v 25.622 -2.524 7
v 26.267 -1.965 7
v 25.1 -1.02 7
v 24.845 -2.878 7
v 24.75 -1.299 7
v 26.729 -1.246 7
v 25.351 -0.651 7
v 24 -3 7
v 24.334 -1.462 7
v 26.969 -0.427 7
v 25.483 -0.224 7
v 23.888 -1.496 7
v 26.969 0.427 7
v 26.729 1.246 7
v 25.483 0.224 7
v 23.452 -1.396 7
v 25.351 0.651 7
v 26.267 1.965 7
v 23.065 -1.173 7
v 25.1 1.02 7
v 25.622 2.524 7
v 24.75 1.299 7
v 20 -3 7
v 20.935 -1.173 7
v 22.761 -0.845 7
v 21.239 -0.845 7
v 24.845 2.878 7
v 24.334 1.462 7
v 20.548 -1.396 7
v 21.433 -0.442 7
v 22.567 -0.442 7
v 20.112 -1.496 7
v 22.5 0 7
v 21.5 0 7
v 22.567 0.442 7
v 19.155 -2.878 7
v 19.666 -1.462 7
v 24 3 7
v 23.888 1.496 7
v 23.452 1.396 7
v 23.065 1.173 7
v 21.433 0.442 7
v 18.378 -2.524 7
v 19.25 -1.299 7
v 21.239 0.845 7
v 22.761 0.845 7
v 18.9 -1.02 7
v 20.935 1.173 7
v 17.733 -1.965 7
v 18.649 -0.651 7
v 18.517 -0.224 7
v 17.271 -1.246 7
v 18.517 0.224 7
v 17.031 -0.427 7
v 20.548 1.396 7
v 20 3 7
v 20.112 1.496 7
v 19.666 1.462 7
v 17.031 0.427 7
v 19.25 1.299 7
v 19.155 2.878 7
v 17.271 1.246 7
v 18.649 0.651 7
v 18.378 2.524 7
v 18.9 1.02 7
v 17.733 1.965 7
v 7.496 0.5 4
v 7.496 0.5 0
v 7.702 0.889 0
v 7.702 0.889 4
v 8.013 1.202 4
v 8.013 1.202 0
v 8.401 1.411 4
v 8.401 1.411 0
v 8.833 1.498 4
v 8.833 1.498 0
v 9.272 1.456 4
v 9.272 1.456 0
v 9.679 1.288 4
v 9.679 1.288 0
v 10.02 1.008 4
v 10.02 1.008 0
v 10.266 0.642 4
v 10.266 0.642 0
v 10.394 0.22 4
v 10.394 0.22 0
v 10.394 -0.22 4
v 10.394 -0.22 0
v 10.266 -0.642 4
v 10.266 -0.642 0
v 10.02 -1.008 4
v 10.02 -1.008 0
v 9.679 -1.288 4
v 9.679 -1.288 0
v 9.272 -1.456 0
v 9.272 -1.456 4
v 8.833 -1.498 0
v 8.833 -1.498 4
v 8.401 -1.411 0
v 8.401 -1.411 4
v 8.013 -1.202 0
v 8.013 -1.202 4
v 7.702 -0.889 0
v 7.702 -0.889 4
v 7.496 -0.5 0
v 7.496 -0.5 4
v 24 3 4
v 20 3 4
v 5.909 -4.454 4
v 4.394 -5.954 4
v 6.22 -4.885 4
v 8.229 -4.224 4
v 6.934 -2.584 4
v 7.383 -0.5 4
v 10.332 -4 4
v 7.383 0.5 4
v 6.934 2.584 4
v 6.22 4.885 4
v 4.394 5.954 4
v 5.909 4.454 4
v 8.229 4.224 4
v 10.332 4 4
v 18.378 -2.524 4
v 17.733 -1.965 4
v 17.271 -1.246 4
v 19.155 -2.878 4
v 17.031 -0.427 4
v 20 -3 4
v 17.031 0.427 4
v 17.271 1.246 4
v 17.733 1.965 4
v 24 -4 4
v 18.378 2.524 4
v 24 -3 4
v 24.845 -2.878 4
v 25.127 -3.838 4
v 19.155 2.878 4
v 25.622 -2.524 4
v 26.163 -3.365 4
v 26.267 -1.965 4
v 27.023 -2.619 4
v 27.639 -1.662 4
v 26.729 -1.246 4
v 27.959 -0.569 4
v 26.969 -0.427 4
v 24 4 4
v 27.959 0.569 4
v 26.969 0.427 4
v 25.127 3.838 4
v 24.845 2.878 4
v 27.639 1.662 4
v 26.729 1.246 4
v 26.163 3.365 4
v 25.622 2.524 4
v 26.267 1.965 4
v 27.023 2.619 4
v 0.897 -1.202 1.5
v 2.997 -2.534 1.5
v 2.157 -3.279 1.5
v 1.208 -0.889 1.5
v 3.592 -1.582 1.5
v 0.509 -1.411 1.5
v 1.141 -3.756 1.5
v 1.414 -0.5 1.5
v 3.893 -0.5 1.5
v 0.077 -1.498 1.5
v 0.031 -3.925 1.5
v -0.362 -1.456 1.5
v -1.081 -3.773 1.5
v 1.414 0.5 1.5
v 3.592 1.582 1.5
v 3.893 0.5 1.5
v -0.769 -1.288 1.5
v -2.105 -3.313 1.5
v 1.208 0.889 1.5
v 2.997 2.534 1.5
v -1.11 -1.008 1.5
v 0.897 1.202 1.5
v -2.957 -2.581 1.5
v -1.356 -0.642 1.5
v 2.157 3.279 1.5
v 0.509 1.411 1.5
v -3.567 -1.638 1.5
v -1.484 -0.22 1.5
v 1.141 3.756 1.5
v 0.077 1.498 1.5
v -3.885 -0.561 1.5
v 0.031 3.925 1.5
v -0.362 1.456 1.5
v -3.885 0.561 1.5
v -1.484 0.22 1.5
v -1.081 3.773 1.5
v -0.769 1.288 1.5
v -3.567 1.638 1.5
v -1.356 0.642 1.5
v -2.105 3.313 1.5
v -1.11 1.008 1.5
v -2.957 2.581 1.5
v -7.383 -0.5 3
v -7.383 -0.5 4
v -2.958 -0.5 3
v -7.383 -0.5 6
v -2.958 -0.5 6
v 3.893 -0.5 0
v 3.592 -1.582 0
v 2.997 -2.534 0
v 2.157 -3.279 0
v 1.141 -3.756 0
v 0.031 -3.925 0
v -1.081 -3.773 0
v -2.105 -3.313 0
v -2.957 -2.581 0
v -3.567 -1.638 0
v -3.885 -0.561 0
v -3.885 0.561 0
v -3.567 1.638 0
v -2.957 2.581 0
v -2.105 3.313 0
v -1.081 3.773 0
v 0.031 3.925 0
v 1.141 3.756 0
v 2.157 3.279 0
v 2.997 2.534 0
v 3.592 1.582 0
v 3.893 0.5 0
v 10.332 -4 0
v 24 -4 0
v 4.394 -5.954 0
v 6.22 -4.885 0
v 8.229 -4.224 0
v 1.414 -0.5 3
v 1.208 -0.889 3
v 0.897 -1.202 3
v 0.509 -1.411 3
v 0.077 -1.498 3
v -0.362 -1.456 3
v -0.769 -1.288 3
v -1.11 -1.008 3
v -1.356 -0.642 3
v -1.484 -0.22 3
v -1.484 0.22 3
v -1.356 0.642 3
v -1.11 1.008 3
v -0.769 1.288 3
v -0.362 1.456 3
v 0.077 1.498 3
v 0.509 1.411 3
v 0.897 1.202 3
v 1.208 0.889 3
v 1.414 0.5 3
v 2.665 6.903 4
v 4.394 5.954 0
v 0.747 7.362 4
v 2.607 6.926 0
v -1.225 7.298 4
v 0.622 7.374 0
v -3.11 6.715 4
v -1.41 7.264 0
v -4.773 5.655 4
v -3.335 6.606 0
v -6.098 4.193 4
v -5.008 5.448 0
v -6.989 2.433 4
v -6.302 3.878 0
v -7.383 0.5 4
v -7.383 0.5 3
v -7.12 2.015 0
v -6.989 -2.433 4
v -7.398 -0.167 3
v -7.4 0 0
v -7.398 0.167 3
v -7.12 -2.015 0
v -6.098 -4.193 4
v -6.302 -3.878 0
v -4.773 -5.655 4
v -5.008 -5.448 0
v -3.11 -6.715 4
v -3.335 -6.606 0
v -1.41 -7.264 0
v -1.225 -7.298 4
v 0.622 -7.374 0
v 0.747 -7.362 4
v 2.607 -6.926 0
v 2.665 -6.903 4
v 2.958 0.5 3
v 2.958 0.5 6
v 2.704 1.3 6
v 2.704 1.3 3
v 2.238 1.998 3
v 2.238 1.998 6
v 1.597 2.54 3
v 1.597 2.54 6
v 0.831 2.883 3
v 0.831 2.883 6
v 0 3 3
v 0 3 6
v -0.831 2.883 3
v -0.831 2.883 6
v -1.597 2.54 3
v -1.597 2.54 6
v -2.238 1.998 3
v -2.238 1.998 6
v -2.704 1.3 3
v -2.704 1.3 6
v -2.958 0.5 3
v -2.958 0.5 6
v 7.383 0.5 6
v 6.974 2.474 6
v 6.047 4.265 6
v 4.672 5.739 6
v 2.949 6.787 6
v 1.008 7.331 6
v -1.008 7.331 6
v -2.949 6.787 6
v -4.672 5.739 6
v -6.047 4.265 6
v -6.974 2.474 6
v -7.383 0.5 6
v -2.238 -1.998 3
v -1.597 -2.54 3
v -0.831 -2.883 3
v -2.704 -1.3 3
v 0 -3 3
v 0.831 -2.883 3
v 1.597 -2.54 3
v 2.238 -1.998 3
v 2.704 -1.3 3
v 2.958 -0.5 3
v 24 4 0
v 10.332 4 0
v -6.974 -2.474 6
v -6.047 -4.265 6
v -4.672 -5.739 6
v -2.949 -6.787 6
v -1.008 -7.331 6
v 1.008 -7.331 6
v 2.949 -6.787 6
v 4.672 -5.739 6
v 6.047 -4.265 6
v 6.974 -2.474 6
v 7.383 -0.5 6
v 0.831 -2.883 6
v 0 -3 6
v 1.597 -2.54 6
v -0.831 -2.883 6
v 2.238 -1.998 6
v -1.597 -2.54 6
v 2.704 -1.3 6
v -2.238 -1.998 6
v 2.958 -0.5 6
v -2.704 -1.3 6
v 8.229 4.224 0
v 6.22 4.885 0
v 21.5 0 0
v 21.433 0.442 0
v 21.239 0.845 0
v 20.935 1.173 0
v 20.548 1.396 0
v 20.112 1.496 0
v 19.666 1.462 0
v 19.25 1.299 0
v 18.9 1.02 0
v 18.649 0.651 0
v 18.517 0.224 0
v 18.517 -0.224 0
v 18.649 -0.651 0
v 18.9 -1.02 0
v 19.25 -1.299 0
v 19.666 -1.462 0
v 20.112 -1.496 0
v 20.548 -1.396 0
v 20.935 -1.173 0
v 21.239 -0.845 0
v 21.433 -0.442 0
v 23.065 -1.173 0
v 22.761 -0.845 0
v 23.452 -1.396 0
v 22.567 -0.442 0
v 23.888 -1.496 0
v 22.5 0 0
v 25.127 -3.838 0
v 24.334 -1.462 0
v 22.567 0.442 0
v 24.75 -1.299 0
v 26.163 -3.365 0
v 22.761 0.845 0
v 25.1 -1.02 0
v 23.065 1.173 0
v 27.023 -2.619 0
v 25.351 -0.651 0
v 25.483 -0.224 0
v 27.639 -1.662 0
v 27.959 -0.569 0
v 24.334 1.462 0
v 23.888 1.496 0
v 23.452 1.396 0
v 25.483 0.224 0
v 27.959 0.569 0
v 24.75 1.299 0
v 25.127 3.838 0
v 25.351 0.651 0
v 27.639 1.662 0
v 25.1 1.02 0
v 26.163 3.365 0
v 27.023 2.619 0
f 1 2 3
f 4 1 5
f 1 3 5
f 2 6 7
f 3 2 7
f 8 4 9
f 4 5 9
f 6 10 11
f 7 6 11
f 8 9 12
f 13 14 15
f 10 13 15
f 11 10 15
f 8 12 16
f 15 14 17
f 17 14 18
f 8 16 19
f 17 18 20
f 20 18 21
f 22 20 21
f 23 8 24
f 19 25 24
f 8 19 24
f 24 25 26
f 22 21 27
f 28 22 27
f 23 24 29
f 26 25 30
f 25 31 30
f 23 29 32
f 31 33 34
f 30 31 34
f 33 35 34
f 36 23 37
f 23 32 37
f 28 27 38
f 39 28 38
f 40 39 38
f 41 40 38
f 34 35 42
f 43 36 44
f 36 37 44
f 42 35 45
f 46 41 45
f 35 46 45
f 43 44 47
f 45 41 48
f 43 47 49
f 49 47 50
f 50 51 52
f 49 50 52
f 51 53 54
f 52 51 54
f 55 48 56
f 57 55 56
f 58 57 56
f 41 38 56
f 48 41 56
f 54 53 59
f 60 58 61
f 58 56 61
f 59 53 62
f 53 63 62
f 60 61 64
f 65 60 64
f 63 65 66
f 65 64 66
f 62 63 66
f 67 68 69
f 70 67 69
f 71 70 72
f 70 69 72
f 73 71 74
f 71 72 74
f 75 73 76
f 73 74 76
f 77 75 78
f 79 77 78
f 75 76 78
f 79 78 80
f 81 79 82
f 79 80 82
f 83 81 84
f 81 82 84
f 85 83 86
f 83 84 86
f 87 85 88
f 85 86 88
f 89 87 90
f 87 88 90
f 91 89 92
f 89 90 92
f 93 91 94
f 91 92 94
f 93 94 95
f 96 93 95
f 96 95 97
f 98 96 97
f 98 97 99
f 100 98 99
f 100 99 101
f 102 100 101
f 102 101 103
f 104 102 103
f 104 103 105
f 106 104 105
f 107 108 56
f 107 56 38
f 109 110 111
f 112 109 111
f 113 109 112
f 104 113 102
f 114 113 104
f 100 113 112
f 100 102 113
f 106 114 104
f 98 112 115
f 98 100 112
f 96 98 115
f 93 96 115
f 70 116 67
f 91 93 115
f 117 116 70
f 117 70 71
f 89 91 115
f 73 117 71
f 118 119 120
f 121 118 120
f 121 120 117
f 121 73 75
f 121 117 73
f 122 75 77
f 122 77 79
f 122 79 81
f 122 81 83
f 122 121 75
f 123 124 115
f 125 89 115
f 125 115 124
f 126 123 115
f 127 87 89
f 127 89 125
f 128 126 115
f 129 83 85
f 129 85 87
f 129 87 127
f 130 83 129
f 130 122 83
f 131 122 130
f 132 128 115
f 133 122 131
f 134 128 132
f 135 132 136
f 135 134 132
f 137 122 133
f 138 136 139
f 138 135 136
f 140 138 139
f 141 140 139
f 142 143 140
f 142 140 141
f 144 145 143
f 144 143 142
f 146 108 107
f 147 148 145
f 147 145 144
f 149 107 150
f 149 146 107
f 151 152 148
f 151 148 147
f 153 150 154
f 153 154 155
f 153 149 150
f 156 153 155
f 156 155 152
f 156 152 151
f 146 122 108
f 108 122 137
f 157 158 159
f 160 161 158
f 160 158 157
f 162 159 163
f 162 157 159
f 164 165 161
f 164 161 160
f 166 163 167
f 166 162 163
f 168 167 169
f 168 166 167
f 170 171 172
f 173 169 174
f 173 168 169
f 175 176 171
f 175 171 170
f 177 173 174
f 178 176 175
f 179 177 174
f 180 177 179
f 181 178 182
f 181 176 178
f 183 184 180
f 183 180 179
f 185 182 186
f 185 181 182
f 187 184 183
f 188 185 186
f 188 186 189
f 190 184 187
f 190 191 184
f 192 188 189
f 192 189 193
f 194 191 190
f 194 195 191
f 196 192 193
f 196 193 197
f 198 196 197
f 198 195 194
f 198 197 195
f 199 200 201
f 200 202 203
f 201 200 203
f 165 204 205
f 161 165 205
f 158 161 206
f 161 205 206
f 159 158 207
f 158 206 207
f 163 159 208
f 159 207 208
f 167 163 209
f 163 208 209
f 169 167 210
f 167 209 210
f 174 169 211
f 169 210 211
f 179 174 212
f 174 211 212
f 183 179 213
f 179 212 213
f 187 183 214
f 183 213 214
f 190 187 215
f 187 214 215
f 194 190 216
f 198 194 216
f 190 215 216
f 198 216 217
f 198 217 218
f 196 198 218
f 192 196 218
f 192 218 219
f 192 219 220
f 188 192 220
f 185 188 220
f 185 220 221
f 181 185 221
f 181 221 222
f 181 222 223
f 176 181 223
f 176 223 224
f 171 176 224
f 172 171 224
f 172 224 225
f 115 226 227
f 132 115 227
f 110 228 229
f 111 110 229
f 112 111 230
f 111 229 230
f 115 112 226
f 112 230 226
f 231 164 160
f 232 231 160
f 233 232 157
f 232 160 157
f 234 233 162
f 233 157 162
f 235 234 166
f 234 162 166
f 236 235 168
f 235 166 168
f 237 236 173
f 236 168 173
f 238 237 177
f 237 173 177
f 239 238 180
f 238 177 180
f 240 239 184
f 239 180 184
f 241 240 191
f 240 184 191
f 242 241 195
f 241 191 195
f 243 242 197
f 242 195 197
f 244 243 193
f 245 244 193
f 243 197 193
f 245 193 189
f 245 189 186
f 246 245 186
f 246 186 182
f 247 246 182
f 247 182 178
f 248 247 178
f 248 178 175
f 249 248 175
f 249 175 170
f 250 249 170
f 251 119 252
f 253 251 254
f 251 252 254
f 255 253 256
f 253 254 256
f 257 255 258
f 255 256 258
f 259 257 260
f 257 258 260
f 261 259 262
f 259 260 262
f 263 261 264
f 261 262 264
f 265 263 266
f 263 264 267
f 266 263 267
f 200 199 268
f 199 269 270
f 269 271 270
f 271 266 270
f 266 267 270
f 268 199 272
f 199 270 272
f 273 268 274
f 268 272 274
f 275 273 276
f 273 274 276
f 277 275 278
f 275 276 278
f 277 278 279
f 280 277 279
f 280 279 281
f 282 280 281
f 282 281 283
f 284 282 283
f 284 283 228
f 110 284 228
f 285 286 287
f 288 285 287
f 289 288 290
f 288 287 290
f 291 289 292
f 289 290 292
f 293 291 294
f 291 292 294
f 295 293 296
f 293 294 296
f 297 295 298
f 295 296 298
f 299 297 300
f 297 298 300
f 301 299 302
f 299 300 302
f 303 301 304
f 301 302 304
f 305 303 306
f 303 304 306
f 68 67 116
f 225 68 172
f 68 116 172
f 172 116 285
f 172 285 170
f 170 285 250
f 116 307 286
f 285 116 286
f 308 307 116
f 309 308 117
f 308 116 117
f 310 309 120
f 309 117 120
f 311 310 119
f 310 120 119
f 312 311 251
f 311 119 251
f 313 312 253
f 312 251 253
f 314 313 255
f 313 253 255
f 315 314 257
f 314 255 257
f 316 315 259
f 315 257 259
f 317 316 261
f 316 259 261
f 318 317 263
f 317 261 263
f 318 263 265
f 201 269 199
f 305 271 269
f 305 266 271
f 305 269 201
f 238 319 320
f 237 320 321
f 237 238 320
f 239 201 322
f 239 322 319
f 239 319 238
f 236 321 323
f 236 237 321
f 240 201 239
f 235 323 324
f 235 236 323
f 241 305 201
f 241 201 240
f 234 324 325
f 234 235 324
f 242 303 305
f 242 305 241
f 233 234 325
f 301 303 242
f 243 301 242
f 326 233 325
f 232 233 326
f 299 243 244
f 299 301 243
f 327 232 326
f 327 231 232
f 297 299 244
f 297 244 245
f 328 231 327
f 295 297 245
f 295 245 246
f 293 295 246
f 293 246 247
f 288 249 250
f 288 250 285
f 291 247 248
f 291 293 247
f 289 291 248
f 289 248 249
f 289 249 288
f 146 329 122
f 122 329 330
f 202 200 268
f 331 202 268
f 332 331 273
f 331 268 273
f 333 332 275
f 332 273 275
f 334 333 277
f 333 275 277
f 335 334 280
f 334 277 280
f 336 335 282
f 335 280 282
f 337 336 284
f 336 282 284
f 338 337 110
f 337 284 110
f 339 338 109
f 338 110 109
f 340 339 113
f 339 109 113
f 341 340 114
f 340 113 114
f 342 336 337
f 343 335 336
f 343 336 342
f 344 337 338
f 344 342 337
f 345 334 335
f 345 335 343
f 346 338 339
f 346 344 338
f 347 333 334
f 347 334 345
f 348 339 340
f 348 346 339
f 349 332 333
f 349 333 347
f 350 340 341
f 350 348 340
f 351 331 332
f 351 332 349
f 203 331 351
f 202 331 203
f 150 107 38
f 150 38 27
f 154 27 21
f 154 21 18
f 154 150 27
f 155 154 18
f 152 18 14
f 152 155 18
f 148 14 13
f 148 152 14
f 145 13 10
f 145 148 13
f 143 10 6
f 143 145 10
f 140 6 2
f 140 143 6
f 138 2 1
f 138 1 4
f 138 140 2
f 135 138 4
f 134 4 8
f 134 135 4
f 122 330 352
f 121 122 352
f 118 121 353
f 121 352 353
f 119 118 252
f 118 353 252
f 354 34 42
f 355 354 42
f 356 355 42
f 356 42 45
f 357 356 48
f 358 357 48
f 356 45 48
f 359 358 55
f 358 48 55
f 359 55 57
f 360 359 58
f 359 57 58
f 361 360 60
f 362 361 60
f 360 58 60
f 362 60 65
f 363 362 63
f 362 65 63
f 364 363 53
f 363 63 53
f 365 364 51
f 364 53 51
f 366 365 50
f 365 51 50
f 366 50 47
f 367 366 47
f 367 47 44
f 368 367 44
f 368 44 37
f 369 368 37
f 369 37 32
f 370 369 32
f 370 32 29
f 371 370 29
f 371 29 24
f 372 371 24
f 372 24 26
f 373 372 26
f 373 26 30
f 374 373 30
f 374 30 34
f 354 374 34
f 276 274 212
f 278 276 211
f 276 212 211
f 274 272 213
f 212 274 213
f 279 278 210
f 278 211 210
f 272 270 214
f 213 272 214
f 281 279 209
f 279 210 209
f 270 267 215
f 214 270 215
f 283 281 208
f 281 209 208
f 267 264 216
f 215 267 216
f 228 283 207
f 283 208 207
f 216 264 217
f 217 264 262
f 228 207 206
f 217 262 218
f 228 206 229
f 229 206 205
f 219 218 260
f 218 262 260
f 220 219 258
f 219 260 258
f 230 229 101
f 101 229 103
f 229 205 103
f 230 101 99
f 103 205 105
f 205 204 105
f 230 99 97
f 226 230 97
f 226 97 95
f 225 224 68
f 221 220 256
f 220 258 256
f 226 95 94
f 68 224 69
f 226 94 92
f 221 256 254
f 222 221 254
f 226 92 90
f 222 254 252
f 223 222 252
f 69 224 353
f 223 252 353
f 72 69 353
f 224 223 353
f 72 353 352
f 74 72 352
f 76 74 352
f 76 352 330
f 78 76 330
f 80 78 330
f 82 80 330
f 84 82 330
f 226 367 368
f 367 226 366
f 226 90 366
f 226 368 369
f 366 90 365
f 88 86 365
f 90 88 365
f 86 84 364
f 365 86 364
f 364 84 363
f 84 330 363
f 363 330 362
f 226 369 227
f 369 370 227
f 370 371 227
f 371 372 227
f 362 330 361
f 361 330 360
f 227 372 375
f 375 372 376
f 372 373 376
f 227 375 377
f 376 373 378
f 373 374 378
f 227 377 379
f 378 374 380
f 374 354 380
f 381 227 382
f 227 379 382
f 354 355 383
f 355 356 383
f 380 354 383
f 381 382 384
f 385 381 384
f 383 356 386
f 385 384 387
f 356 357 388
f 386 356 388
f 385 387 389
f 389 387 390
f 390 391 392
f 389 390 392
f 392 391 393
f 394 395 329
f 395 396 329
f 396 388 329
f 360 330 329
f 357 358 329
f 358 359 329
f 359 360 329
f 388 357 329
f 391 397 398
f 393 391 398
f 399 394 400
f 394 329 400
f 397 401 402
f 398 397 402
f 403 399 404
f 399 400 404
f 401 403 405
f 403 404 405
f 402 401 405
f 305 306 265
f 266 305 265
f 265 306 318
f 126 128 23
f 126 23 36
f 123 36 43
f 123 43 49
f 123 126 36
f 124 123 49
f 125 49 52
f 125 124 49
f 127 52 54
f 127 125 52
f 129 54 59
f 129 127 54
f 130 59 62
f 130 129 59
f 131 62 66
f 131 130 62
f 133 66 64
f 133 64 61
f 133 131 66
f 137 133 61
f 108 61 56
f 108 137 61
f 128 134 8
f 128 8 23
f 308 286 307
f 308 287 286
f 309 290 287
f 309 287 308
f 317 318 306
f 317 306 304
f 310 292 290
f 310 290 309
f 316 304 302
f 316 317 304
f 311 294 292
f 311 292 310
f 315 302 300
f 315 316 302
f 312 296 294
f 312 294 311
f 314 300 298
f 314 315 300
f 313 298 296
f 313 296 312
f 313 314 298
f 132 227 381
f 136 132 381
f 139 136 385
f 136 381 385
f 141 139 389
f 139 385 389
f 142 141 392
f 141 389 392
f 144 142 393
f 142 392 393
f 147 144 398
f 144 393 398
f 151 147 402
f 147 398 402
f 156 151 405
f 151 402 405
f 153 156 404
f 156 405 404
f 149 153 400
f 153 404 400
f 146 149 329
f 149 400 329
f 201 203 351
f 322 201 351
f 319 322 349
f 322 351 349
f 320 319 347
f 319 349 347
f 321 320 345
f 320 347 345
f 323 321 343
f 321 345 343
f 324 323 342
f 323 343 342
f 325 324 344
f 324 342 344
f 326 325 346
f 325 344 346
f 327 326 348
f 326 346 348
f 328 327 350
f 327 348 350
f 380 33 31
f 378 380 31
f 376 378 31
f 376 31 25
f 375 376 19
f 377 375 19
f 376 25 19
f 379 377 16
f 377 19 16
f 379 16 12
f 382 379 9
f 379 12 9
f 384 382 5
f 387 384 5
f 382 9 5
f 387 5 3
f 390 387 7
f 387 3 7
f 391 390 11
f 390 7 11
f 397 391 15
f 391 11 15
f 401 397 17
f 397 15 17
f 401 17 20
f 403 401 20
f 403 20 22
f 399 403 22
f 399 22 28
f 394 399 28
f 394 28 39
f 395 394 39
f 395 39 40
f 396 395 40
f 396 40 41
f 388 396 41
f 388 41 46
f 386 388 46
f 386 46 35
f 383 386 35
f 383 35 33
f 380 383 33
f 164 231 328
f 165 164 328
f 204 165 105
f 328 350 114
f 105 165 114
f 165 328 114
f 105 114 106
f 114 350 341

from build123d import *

# Parameters (mm, degrees)
EXTRUDE_1_DEPTH     = 4
SKETCH_3_R          = 7.4
EXTRUDE_2_DEPTH     = 2
EXTRUDE_3_DEPTH     = 3
CUT_EXTRUDE_1_DEPTH = 3
SKETCH_7_R          = 1.5
CUT_EXTRUDE_2_DEPTH = 30.795301643
CUT_EXTRUDE_3_DEPTH = 30.795301643
SKETCH_10_R         = 3.925
CUT_EXTRUDE_4_DEPTH = 1.5


with BuildPart() as part:
    # ｽｹｯﾁ2 → ﾎﾞｽ - 押し出し1 (new body)
    with BuildSketch(Plane.XY):
        with BuildLine():
            Line((24, 4), (10.332473082, 4))
            ThreePointArc((10.332473082, 4), (7.206754774, 4.50105874), (4.394270162, 5.954022989))
            ThreePointArc((4.394270162, 5.954022989), (-7.4, 0), (4.394270162, -5.954022989))
            ThreePointArc((4.394270162, -5.954022989), (7.206754774, -4.50105874), (10.332473082, -4))
            Line((10.332473082, -4), (24, -4))
            ThreePointArc((24, -4), (28, 0), (24, 4))
        make_face()
    extrude(amount=EXTRUDE_1_DEPTH)

    # ｽｹｯﾁ3 → ﾎﾞｽ - 押し出し2 (add)
    with BuildSketch(Plane.XY.offset(4)):
        with Locations(Location((0, 0, 0), (0, 0, 53.571420986))):
            Circle(SKETCH_3_R)
    extrude(amount=EXTRUDE_2_DEPTH)

    # ｽｹｯﾁ4 → ﾎﾞｽ - 押し出し3 (add)
    with BuildSketch(Plane.XY.offset(4)):
        with BuildLine():
            Line((24, -3), (20, -3))
            ThreePointArc((20, -3), (17, 0), (20, 3))
            Line((20, 3), (24, 3))
            ThreePointArc((24, 3), (27, 0), (24, -3))
        make_face()
    extrude(amount=EXTRUDE_3_DEPTH)

    # ｽｹｯﾁ6 → ｶｯﾄ - 押し出し1 (cut)
    with BuildSketch(Plane.XY.offset(6)):
        with BuildLine():
            Line((7.4, 0.5), (2.958039892, 0.5))
            ThreePointArc((2.958039892, 0.5), (0, 3), (-2.958039892, 0.5))
            Line((-2.958039892, 0.5), (-7.4, 0.5))
            Line((-7.4, 0.5), (-7.4, -0.5))
            Line((-7.4, -0.5), (-2.958039892, -0.5))
            ThreePointArc((-2.958039892, -0.5), (0, -3), (2.958039892, -0.5))
            Line((2.958039892, -0.5), (7.4, -0.5))
            Line((7.4, -0.5), (7.4, 0.5))
        make_face()
    extrude(amount=-CUT_EXTRUDE_1_DEPTH, mode=Mode.SUBTRACT)

    # ｽｹｯﾁ7 → ｶｯﾄ - 押し出し2 (cut, through all)
    with BuildSketch(Plane.XY.offset(7)):
        with Locations((20, 0)):
            Circle(SKETCH_7_R)
        with Locations(Location((24, 0, 0), (0, 0, 180))):
            Circle(SKETCH_7_R)
    extrude(amount=-CUT_EXTRUDE_2_DEPTH, mode=Mode.SUBTRACT)

    # ｽｹｯﾁ8 → ｶｯﾄ - 押し出し3 (cut, through all)
    with BuildSketch(Plane(origin=(0, 0, 0), x_dir=(-1, 0, 0), z_dir=(0, 0, -1))):
        with BuildLine():
            ThreePointArc((-1.414213562, -0.5), (1.5, 0), (-1.414213562, 0.5))
            Line((-1.414213562, 0.5), (-7.495786438, 0.5))
            ThreePointArc((-7.495786438, 0.5), (-10.41, 0), (-7.495786438, -0.5))
            Line((-7.495786438, -0.5), (-1.414213562, -0.5))
        make_face()
    extrude(amount=-CUT_EXTRUDE_3_DEPTH, mode=Mode.SUBTRACT)

    # ｽｹｯﾁ10 → ｶｯﾄ - 押し出し4 (cut)
    with BuildSketch(Plane(origin=(0, 0, 0), x_dir=(-1, 0, 0), z_dir=(0, 0, -1))):
        Circle(SKETCH_10_R)
    extrude(amount=-CUT_EXTRUDE_4_DEPTH, mode=Mode.SUBTRACT)


solid = part.part
